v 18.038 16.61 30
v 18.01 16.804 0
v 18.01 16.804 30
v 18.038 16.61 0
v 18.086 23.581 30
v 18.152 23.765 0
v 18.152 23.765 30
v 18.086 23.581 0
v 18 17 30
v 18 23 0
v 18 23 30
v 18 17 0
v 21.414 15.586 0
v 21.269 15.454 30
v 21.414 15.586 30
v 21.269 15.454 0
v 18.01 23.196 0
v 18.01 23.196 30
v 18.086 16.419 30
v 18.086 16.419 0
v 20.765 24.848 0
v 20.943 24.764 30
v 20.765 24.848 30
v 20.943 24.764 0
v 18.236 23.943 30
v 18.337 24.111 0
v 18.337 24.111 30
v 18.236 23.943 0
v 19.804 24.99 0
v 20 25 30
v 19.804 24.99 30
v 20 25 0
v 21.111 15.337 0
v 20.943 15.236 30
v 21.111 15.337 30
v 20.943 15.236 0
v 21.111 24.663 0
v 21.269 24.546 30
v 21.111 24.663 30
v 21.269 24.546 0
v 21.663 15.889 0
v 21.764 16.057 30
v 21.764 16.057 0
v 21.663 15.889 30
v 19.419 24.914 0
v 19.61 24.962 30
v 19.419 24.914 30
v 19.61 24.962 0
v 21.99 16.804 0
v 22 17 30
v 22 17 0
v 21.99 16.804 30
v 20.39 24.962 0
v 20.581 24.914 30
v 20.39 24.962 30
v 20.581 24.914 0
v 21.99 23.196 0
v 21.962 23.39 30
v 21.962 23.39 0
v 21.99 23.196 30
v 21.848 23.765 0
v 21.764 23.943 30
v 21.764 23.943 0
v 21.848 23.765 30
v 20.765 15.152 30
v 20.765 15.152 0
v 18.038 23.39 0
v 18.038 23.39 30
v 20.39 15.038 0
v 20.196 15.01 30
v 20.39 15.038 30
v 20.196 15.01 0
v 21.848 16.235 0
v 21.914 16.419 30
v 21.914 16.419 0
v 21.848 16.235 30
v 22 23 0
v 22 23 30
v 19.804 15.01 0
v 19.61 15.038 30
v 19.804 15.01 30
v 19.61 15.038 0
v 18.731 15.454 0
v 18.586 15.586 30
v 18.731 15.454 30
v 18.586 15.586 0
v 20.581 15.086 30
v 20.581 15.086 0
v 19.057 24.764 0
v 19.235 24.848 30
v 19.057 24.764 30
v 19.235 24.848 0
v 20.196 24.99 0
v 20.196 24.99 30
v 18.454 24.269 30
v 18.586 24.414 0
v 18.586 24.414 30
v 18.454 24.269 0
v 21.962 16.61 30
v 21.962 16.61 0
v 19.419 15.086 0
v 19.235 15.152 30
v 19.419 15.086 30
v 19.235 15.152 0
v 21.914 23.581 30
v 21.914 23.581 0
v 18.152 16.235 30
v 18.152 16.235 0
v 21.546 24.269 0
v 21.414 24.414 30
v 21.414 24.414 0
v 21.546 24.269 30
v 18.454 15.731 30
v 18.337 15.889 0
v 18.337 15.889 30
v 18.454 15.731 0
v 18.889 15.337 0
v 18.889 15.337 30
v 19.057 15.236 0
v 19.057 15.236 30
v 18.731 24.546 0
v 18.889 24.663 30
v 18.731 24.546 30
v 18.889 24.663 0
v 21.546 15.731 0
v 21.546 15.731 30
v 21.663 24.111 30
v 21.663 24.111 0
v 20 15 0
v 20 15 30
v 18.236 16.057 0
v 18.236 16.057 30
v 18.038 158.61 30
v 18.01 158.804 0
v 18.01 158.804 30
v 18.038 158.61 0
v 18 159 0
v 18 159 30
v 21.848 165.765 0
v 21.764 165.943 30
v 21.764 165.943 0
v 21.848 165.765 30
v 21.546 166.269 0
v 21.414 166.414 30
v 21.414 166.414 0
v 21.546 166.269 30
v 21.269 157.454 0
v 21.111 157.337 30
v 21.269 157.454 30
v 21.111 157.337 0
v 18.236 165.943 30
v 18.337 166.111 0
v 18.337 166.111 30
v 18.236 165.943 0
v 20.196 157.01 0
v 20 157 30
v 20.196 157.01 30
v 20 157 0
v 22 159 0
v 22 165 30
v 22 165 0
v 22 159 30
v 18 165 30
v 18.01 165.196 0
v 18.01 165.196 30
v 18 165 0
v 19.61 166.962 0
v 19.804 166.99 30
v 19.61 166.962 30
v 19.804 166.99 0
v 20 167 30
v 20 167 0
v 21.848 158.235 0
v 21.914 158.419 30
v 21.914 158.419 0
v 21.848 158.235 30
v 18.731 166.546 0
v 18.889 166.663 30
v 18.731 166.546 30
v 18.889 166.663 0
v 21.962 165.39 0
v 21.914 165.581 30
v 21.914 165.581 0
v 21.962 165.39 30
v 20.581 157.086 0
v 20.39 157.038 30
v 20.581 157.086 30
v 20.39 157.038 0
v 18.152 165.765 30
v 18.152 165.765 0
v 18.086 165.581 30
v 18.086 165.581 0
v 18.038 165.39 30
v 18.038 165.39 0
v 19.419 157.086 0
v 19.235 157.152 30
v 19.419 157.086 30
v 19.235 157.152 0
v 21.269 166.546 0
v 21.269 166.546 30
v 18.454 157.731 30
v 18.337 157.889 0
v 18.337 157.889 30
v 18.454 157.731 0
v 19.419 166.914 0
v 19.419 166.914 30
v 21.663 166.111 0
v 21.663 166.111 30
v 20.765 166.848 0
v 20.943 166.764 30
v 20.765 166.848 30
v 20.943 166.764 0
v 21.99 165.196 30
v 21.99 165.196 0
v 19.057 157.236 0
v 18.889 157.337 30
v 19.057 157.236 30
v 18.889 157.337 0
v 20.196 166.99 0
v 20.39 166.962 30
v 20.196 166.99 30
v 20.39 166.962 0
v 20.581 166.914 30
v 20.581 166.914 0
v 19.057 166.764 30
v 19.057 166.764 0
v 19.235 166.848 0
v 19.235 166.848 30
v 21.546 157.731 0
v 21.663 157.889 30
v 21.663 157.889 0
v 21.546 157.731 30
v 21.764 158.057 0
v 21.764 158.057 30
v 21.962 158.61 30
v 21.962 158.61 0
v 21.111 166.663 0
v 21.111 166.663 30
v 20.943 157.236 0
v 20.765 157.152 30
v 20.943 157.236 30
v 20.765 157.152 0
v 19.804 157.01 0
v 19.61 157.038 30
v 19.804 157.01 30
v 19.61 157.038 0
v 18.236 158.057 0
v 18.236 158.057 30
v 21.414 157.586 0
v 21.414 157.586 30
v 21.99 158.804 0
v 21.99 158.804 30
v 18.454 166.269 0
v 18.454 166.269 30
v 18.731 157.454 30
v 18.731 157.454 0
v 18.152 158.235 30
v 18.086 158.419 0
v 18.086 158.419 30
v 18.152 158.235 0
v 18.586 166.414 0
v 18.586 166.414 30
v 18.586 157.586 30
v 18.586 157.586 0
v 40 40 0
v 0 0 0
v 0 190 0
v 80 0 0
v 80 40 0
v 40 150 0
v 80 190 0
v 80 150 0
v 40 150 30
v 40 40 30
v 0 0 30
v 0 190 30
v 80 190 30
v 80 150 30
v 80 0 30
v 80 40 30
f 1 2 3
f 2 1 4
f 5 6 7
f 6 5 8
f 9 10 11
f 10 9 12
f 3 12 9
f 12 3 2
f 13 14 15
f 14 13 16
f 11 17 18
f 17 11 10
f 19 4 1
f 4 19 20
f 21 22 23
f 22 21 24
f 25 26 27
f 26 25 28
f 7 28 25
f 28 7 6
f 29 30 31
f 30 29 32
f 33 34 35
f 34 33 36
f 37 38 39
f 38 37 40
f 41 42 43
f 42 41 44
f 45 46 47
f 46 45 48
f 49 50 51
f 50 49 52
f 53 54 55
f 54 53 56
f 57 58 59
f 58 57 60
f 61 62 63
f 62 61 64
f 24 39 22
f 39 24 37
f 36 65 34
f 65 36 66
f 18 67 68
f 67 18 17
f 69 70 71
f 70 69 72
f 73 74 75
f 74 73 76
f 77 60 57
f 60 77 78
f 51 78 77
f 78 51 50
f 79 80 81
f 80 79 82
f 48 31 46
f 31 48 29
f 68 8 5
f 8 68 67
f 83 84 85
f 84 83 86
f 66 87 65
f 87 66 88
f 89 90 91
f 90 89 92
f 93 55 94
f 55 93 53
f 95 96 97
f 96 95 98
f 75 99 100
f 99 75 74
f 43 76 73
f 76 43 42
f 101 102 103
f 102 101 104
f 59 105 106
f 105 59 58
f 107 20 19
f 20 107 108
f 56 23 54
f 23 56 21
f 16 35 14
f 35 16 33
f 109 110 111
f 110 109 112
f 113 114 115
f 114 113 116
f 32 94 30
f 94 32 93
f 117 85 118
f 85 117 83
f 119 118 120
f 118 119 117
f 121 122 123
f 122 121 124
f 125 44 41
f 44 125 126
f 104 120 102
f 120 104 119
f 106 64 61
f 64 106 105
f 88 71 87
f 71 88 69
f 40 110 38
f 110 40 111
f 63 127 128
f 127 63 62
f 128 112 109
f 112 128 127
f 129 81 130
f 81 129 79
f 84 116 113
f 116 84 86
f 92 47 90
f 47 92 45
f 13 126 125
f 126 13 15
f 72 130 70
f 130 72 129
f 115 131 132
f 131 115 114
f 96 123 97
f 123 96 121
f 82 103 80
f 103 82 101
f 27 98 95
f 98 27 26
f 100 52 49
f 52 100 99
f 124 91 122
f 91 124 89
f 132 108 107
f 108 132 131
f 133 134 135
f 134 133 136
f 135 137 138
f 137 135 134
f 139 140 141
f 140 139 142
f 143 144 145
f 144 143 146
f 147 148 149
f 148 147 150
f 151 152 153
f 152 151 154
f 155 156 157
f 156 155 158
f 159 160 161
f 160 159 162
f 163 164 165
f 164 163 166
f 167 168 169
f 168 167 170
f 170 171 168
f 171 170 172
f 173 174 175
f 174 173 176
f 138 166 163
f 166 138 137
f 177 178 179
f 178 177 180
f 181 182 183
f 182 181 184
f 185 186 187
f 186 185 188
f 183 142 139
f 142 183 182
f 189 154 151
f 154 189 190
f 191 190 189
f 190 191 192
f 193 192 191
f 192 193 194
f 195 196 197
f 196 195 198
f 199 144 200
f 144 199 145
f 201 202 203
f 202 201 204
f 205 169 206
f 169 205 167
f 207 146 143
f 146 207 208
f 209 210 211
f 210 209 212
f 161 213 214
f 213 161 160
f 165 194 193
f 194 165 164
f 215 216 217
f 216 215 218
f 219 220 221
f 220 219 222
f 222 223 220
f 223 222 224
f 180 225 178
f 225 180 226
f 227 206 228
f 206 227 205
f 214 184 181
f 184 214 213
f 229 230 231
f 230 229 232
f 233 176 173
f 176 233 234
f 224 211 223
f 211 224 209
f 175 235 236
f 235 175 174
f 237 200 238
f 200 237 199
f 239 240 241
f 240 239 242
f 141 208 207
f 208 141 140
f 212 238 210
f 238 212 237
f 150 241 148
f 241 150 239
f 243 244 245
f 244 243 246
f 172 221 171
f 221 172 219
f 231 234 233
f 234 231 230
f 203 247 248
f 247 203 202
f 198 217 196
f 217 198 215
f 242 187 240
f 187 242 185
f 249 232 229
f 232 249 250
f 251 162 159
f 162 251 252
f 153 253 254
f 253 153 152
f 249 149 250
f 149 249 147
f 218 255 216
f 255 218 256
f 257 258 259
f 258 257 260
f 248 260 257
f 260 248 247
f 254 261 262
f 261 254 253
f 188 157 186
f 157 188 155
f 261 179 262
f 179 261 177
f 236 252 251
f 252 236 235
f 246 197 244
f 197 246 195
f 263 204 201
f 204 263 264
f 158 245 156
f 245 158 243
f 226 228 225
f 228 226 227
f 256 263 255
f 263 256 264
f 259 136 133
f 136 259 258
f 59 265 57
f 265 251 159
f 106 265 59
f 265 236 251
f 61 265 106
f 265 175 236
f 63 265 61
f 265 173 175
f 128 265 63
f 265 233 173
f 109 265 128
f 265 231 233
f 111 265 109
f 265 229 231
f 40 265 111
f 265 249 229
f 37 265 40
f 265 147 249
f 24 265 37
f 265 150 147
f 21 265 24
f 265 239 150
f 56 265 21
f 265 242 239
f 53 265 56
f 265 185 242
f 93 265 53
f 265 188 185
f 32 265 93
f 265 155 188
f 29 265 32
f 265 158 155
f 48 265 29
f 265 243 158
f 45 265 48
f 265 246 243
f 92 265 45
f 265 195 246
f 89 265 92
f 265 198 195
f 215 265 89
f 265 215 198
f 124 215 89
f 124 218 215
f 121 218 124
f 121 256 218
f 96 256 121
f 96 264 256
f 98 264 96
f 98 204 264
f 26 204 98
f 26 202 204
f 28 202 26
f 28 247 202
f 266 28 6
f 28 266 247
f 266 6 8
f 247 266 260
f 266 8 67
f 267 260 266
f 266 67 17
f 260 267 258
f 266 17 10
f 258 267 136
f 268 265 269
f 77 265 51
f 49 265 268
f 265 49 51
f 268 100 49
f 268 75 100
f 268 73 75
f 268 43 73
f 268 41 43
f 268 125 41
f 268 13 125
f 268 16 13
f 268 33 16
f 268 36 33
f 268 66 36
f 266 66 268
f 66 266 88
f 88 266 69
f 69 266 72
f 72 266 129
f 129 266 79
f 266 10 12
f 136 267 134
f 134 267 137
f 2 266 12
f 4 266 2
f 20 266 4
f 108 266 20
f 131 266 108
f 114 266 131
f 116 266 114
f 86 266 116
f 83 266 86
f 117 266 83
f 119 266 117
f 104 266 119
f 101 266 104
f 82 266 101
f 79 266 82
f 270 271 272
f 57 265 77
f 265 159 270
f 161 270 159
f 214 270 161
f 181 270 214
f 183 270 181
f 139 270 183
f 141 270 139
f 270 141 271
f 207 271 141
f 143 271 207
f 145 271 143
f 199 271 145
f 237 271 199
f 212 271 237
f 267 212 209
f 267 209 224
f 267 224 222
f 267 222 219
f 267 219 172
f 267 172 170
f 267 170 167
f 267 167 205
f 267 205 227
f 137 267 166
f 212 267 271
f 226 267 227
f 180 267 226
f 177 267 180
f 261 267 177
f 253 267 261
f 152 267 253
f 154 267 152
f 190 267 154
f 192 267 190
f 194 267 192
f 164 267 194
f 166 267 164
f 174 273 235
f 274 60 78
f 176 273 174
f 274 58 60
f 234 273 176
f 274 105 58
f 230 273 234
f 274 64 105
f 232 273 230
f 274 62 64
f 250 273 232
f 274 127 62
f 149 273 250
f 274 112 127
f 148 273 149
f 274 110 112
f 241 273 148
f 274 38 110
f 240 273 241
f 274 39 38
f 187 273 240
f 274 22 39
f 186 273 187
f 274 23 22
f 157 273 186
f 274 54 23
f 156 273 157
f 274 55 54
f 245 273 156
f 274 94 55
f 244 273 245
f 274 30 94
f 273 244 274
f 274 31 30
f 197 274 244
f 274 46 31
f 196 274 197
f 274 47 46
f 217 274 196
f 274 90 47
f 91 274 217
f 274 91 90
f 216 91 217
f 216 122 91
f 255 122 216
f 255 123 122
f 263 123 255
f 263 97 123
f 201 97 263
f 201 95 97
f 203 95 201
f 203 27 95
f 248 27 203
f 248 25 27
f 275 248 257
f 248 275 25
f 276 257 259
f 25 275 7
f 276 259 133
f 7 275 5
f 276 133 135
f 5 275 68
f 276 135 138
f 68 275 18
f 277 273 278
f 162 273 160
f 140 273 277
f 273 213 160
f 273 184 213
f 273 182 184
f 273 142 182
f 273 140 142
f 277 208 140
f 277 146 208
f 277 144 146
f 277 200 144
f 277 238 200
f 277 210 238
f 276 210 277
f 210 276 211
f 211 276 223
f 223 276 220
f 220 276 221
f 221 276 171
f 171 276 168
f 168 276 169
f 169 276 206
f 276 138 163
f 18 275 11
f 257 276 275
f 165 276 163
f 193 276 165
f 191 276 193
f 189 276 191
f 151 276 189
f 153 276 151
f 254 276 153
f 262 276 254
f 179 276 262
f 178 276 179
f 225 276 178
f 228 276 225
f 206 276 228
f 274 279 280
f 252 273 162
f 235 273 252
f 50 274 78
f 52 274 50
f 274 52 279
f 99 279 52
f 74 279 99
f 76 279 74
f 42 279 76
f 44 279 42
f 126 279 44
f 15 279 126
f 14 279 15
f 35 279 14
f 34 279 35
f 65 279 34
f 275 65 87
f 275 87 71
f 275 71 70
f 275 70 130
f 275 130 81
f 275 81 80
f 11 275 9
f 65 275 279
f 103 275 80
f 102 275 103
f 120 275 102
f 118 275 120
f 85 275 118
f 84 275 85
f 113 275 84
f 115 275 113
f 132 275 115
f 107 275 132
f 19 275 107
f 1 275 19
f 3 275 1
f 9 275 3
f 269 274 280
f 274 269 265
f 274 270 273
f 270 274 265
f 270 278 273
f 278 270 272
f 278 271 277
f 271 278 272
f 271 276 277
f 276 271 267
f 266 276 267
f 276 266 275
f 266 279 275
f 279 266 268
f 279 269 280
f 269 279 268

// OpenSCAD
// Letter "C" polygon, extruded
//   longest edge (overall height) : 190 mm
//   shorter ends (arm length)     :  80 mm
//   band width (whole thing wide) :  40 mm
//   extrusion depth               :  30 mm
// Overall size: 80 wide x 190 tall x 30 deep, opening faces +X.

height = 190;  // longest edge
arm    = 80;   // shorter ends
band   = 40;   // whole thing wide
depth  = 30;   // extrusion

// Screw slots (stadium / obround), through the back band
slot_d   = 4;        // hole diameter
slot_len = 10;       // overall slot length
slot_x   = band / 2; // centred on height axis (band centre)
slot_y   = [20, 162];

module stadium(x, y) {
    translate([x, y, -1])
        linear_extrude(height = depth + 2)
            hull() {
                translate([0, -(slot_len - slot_d) / 2]) circle(d = slot_d, $fn = 64);
                translate([0,  (slot_len - slot_d) / 2]) circle(d = slot_d, $fn = 64);
            }
}

difference() {
    linear_extrude(height = depth)
        polygon(points = [
            [0,            0          ],
            [arm,          0          ],
            [arm,          band       ],
            [band,         band       ],
            [band,         height-band],
            [arm,          height-band],
            [arm,          height     ],
            [0,            height     ]
        ]);

    for (y = slot_y)
        stadium(slot_x, y);
}
